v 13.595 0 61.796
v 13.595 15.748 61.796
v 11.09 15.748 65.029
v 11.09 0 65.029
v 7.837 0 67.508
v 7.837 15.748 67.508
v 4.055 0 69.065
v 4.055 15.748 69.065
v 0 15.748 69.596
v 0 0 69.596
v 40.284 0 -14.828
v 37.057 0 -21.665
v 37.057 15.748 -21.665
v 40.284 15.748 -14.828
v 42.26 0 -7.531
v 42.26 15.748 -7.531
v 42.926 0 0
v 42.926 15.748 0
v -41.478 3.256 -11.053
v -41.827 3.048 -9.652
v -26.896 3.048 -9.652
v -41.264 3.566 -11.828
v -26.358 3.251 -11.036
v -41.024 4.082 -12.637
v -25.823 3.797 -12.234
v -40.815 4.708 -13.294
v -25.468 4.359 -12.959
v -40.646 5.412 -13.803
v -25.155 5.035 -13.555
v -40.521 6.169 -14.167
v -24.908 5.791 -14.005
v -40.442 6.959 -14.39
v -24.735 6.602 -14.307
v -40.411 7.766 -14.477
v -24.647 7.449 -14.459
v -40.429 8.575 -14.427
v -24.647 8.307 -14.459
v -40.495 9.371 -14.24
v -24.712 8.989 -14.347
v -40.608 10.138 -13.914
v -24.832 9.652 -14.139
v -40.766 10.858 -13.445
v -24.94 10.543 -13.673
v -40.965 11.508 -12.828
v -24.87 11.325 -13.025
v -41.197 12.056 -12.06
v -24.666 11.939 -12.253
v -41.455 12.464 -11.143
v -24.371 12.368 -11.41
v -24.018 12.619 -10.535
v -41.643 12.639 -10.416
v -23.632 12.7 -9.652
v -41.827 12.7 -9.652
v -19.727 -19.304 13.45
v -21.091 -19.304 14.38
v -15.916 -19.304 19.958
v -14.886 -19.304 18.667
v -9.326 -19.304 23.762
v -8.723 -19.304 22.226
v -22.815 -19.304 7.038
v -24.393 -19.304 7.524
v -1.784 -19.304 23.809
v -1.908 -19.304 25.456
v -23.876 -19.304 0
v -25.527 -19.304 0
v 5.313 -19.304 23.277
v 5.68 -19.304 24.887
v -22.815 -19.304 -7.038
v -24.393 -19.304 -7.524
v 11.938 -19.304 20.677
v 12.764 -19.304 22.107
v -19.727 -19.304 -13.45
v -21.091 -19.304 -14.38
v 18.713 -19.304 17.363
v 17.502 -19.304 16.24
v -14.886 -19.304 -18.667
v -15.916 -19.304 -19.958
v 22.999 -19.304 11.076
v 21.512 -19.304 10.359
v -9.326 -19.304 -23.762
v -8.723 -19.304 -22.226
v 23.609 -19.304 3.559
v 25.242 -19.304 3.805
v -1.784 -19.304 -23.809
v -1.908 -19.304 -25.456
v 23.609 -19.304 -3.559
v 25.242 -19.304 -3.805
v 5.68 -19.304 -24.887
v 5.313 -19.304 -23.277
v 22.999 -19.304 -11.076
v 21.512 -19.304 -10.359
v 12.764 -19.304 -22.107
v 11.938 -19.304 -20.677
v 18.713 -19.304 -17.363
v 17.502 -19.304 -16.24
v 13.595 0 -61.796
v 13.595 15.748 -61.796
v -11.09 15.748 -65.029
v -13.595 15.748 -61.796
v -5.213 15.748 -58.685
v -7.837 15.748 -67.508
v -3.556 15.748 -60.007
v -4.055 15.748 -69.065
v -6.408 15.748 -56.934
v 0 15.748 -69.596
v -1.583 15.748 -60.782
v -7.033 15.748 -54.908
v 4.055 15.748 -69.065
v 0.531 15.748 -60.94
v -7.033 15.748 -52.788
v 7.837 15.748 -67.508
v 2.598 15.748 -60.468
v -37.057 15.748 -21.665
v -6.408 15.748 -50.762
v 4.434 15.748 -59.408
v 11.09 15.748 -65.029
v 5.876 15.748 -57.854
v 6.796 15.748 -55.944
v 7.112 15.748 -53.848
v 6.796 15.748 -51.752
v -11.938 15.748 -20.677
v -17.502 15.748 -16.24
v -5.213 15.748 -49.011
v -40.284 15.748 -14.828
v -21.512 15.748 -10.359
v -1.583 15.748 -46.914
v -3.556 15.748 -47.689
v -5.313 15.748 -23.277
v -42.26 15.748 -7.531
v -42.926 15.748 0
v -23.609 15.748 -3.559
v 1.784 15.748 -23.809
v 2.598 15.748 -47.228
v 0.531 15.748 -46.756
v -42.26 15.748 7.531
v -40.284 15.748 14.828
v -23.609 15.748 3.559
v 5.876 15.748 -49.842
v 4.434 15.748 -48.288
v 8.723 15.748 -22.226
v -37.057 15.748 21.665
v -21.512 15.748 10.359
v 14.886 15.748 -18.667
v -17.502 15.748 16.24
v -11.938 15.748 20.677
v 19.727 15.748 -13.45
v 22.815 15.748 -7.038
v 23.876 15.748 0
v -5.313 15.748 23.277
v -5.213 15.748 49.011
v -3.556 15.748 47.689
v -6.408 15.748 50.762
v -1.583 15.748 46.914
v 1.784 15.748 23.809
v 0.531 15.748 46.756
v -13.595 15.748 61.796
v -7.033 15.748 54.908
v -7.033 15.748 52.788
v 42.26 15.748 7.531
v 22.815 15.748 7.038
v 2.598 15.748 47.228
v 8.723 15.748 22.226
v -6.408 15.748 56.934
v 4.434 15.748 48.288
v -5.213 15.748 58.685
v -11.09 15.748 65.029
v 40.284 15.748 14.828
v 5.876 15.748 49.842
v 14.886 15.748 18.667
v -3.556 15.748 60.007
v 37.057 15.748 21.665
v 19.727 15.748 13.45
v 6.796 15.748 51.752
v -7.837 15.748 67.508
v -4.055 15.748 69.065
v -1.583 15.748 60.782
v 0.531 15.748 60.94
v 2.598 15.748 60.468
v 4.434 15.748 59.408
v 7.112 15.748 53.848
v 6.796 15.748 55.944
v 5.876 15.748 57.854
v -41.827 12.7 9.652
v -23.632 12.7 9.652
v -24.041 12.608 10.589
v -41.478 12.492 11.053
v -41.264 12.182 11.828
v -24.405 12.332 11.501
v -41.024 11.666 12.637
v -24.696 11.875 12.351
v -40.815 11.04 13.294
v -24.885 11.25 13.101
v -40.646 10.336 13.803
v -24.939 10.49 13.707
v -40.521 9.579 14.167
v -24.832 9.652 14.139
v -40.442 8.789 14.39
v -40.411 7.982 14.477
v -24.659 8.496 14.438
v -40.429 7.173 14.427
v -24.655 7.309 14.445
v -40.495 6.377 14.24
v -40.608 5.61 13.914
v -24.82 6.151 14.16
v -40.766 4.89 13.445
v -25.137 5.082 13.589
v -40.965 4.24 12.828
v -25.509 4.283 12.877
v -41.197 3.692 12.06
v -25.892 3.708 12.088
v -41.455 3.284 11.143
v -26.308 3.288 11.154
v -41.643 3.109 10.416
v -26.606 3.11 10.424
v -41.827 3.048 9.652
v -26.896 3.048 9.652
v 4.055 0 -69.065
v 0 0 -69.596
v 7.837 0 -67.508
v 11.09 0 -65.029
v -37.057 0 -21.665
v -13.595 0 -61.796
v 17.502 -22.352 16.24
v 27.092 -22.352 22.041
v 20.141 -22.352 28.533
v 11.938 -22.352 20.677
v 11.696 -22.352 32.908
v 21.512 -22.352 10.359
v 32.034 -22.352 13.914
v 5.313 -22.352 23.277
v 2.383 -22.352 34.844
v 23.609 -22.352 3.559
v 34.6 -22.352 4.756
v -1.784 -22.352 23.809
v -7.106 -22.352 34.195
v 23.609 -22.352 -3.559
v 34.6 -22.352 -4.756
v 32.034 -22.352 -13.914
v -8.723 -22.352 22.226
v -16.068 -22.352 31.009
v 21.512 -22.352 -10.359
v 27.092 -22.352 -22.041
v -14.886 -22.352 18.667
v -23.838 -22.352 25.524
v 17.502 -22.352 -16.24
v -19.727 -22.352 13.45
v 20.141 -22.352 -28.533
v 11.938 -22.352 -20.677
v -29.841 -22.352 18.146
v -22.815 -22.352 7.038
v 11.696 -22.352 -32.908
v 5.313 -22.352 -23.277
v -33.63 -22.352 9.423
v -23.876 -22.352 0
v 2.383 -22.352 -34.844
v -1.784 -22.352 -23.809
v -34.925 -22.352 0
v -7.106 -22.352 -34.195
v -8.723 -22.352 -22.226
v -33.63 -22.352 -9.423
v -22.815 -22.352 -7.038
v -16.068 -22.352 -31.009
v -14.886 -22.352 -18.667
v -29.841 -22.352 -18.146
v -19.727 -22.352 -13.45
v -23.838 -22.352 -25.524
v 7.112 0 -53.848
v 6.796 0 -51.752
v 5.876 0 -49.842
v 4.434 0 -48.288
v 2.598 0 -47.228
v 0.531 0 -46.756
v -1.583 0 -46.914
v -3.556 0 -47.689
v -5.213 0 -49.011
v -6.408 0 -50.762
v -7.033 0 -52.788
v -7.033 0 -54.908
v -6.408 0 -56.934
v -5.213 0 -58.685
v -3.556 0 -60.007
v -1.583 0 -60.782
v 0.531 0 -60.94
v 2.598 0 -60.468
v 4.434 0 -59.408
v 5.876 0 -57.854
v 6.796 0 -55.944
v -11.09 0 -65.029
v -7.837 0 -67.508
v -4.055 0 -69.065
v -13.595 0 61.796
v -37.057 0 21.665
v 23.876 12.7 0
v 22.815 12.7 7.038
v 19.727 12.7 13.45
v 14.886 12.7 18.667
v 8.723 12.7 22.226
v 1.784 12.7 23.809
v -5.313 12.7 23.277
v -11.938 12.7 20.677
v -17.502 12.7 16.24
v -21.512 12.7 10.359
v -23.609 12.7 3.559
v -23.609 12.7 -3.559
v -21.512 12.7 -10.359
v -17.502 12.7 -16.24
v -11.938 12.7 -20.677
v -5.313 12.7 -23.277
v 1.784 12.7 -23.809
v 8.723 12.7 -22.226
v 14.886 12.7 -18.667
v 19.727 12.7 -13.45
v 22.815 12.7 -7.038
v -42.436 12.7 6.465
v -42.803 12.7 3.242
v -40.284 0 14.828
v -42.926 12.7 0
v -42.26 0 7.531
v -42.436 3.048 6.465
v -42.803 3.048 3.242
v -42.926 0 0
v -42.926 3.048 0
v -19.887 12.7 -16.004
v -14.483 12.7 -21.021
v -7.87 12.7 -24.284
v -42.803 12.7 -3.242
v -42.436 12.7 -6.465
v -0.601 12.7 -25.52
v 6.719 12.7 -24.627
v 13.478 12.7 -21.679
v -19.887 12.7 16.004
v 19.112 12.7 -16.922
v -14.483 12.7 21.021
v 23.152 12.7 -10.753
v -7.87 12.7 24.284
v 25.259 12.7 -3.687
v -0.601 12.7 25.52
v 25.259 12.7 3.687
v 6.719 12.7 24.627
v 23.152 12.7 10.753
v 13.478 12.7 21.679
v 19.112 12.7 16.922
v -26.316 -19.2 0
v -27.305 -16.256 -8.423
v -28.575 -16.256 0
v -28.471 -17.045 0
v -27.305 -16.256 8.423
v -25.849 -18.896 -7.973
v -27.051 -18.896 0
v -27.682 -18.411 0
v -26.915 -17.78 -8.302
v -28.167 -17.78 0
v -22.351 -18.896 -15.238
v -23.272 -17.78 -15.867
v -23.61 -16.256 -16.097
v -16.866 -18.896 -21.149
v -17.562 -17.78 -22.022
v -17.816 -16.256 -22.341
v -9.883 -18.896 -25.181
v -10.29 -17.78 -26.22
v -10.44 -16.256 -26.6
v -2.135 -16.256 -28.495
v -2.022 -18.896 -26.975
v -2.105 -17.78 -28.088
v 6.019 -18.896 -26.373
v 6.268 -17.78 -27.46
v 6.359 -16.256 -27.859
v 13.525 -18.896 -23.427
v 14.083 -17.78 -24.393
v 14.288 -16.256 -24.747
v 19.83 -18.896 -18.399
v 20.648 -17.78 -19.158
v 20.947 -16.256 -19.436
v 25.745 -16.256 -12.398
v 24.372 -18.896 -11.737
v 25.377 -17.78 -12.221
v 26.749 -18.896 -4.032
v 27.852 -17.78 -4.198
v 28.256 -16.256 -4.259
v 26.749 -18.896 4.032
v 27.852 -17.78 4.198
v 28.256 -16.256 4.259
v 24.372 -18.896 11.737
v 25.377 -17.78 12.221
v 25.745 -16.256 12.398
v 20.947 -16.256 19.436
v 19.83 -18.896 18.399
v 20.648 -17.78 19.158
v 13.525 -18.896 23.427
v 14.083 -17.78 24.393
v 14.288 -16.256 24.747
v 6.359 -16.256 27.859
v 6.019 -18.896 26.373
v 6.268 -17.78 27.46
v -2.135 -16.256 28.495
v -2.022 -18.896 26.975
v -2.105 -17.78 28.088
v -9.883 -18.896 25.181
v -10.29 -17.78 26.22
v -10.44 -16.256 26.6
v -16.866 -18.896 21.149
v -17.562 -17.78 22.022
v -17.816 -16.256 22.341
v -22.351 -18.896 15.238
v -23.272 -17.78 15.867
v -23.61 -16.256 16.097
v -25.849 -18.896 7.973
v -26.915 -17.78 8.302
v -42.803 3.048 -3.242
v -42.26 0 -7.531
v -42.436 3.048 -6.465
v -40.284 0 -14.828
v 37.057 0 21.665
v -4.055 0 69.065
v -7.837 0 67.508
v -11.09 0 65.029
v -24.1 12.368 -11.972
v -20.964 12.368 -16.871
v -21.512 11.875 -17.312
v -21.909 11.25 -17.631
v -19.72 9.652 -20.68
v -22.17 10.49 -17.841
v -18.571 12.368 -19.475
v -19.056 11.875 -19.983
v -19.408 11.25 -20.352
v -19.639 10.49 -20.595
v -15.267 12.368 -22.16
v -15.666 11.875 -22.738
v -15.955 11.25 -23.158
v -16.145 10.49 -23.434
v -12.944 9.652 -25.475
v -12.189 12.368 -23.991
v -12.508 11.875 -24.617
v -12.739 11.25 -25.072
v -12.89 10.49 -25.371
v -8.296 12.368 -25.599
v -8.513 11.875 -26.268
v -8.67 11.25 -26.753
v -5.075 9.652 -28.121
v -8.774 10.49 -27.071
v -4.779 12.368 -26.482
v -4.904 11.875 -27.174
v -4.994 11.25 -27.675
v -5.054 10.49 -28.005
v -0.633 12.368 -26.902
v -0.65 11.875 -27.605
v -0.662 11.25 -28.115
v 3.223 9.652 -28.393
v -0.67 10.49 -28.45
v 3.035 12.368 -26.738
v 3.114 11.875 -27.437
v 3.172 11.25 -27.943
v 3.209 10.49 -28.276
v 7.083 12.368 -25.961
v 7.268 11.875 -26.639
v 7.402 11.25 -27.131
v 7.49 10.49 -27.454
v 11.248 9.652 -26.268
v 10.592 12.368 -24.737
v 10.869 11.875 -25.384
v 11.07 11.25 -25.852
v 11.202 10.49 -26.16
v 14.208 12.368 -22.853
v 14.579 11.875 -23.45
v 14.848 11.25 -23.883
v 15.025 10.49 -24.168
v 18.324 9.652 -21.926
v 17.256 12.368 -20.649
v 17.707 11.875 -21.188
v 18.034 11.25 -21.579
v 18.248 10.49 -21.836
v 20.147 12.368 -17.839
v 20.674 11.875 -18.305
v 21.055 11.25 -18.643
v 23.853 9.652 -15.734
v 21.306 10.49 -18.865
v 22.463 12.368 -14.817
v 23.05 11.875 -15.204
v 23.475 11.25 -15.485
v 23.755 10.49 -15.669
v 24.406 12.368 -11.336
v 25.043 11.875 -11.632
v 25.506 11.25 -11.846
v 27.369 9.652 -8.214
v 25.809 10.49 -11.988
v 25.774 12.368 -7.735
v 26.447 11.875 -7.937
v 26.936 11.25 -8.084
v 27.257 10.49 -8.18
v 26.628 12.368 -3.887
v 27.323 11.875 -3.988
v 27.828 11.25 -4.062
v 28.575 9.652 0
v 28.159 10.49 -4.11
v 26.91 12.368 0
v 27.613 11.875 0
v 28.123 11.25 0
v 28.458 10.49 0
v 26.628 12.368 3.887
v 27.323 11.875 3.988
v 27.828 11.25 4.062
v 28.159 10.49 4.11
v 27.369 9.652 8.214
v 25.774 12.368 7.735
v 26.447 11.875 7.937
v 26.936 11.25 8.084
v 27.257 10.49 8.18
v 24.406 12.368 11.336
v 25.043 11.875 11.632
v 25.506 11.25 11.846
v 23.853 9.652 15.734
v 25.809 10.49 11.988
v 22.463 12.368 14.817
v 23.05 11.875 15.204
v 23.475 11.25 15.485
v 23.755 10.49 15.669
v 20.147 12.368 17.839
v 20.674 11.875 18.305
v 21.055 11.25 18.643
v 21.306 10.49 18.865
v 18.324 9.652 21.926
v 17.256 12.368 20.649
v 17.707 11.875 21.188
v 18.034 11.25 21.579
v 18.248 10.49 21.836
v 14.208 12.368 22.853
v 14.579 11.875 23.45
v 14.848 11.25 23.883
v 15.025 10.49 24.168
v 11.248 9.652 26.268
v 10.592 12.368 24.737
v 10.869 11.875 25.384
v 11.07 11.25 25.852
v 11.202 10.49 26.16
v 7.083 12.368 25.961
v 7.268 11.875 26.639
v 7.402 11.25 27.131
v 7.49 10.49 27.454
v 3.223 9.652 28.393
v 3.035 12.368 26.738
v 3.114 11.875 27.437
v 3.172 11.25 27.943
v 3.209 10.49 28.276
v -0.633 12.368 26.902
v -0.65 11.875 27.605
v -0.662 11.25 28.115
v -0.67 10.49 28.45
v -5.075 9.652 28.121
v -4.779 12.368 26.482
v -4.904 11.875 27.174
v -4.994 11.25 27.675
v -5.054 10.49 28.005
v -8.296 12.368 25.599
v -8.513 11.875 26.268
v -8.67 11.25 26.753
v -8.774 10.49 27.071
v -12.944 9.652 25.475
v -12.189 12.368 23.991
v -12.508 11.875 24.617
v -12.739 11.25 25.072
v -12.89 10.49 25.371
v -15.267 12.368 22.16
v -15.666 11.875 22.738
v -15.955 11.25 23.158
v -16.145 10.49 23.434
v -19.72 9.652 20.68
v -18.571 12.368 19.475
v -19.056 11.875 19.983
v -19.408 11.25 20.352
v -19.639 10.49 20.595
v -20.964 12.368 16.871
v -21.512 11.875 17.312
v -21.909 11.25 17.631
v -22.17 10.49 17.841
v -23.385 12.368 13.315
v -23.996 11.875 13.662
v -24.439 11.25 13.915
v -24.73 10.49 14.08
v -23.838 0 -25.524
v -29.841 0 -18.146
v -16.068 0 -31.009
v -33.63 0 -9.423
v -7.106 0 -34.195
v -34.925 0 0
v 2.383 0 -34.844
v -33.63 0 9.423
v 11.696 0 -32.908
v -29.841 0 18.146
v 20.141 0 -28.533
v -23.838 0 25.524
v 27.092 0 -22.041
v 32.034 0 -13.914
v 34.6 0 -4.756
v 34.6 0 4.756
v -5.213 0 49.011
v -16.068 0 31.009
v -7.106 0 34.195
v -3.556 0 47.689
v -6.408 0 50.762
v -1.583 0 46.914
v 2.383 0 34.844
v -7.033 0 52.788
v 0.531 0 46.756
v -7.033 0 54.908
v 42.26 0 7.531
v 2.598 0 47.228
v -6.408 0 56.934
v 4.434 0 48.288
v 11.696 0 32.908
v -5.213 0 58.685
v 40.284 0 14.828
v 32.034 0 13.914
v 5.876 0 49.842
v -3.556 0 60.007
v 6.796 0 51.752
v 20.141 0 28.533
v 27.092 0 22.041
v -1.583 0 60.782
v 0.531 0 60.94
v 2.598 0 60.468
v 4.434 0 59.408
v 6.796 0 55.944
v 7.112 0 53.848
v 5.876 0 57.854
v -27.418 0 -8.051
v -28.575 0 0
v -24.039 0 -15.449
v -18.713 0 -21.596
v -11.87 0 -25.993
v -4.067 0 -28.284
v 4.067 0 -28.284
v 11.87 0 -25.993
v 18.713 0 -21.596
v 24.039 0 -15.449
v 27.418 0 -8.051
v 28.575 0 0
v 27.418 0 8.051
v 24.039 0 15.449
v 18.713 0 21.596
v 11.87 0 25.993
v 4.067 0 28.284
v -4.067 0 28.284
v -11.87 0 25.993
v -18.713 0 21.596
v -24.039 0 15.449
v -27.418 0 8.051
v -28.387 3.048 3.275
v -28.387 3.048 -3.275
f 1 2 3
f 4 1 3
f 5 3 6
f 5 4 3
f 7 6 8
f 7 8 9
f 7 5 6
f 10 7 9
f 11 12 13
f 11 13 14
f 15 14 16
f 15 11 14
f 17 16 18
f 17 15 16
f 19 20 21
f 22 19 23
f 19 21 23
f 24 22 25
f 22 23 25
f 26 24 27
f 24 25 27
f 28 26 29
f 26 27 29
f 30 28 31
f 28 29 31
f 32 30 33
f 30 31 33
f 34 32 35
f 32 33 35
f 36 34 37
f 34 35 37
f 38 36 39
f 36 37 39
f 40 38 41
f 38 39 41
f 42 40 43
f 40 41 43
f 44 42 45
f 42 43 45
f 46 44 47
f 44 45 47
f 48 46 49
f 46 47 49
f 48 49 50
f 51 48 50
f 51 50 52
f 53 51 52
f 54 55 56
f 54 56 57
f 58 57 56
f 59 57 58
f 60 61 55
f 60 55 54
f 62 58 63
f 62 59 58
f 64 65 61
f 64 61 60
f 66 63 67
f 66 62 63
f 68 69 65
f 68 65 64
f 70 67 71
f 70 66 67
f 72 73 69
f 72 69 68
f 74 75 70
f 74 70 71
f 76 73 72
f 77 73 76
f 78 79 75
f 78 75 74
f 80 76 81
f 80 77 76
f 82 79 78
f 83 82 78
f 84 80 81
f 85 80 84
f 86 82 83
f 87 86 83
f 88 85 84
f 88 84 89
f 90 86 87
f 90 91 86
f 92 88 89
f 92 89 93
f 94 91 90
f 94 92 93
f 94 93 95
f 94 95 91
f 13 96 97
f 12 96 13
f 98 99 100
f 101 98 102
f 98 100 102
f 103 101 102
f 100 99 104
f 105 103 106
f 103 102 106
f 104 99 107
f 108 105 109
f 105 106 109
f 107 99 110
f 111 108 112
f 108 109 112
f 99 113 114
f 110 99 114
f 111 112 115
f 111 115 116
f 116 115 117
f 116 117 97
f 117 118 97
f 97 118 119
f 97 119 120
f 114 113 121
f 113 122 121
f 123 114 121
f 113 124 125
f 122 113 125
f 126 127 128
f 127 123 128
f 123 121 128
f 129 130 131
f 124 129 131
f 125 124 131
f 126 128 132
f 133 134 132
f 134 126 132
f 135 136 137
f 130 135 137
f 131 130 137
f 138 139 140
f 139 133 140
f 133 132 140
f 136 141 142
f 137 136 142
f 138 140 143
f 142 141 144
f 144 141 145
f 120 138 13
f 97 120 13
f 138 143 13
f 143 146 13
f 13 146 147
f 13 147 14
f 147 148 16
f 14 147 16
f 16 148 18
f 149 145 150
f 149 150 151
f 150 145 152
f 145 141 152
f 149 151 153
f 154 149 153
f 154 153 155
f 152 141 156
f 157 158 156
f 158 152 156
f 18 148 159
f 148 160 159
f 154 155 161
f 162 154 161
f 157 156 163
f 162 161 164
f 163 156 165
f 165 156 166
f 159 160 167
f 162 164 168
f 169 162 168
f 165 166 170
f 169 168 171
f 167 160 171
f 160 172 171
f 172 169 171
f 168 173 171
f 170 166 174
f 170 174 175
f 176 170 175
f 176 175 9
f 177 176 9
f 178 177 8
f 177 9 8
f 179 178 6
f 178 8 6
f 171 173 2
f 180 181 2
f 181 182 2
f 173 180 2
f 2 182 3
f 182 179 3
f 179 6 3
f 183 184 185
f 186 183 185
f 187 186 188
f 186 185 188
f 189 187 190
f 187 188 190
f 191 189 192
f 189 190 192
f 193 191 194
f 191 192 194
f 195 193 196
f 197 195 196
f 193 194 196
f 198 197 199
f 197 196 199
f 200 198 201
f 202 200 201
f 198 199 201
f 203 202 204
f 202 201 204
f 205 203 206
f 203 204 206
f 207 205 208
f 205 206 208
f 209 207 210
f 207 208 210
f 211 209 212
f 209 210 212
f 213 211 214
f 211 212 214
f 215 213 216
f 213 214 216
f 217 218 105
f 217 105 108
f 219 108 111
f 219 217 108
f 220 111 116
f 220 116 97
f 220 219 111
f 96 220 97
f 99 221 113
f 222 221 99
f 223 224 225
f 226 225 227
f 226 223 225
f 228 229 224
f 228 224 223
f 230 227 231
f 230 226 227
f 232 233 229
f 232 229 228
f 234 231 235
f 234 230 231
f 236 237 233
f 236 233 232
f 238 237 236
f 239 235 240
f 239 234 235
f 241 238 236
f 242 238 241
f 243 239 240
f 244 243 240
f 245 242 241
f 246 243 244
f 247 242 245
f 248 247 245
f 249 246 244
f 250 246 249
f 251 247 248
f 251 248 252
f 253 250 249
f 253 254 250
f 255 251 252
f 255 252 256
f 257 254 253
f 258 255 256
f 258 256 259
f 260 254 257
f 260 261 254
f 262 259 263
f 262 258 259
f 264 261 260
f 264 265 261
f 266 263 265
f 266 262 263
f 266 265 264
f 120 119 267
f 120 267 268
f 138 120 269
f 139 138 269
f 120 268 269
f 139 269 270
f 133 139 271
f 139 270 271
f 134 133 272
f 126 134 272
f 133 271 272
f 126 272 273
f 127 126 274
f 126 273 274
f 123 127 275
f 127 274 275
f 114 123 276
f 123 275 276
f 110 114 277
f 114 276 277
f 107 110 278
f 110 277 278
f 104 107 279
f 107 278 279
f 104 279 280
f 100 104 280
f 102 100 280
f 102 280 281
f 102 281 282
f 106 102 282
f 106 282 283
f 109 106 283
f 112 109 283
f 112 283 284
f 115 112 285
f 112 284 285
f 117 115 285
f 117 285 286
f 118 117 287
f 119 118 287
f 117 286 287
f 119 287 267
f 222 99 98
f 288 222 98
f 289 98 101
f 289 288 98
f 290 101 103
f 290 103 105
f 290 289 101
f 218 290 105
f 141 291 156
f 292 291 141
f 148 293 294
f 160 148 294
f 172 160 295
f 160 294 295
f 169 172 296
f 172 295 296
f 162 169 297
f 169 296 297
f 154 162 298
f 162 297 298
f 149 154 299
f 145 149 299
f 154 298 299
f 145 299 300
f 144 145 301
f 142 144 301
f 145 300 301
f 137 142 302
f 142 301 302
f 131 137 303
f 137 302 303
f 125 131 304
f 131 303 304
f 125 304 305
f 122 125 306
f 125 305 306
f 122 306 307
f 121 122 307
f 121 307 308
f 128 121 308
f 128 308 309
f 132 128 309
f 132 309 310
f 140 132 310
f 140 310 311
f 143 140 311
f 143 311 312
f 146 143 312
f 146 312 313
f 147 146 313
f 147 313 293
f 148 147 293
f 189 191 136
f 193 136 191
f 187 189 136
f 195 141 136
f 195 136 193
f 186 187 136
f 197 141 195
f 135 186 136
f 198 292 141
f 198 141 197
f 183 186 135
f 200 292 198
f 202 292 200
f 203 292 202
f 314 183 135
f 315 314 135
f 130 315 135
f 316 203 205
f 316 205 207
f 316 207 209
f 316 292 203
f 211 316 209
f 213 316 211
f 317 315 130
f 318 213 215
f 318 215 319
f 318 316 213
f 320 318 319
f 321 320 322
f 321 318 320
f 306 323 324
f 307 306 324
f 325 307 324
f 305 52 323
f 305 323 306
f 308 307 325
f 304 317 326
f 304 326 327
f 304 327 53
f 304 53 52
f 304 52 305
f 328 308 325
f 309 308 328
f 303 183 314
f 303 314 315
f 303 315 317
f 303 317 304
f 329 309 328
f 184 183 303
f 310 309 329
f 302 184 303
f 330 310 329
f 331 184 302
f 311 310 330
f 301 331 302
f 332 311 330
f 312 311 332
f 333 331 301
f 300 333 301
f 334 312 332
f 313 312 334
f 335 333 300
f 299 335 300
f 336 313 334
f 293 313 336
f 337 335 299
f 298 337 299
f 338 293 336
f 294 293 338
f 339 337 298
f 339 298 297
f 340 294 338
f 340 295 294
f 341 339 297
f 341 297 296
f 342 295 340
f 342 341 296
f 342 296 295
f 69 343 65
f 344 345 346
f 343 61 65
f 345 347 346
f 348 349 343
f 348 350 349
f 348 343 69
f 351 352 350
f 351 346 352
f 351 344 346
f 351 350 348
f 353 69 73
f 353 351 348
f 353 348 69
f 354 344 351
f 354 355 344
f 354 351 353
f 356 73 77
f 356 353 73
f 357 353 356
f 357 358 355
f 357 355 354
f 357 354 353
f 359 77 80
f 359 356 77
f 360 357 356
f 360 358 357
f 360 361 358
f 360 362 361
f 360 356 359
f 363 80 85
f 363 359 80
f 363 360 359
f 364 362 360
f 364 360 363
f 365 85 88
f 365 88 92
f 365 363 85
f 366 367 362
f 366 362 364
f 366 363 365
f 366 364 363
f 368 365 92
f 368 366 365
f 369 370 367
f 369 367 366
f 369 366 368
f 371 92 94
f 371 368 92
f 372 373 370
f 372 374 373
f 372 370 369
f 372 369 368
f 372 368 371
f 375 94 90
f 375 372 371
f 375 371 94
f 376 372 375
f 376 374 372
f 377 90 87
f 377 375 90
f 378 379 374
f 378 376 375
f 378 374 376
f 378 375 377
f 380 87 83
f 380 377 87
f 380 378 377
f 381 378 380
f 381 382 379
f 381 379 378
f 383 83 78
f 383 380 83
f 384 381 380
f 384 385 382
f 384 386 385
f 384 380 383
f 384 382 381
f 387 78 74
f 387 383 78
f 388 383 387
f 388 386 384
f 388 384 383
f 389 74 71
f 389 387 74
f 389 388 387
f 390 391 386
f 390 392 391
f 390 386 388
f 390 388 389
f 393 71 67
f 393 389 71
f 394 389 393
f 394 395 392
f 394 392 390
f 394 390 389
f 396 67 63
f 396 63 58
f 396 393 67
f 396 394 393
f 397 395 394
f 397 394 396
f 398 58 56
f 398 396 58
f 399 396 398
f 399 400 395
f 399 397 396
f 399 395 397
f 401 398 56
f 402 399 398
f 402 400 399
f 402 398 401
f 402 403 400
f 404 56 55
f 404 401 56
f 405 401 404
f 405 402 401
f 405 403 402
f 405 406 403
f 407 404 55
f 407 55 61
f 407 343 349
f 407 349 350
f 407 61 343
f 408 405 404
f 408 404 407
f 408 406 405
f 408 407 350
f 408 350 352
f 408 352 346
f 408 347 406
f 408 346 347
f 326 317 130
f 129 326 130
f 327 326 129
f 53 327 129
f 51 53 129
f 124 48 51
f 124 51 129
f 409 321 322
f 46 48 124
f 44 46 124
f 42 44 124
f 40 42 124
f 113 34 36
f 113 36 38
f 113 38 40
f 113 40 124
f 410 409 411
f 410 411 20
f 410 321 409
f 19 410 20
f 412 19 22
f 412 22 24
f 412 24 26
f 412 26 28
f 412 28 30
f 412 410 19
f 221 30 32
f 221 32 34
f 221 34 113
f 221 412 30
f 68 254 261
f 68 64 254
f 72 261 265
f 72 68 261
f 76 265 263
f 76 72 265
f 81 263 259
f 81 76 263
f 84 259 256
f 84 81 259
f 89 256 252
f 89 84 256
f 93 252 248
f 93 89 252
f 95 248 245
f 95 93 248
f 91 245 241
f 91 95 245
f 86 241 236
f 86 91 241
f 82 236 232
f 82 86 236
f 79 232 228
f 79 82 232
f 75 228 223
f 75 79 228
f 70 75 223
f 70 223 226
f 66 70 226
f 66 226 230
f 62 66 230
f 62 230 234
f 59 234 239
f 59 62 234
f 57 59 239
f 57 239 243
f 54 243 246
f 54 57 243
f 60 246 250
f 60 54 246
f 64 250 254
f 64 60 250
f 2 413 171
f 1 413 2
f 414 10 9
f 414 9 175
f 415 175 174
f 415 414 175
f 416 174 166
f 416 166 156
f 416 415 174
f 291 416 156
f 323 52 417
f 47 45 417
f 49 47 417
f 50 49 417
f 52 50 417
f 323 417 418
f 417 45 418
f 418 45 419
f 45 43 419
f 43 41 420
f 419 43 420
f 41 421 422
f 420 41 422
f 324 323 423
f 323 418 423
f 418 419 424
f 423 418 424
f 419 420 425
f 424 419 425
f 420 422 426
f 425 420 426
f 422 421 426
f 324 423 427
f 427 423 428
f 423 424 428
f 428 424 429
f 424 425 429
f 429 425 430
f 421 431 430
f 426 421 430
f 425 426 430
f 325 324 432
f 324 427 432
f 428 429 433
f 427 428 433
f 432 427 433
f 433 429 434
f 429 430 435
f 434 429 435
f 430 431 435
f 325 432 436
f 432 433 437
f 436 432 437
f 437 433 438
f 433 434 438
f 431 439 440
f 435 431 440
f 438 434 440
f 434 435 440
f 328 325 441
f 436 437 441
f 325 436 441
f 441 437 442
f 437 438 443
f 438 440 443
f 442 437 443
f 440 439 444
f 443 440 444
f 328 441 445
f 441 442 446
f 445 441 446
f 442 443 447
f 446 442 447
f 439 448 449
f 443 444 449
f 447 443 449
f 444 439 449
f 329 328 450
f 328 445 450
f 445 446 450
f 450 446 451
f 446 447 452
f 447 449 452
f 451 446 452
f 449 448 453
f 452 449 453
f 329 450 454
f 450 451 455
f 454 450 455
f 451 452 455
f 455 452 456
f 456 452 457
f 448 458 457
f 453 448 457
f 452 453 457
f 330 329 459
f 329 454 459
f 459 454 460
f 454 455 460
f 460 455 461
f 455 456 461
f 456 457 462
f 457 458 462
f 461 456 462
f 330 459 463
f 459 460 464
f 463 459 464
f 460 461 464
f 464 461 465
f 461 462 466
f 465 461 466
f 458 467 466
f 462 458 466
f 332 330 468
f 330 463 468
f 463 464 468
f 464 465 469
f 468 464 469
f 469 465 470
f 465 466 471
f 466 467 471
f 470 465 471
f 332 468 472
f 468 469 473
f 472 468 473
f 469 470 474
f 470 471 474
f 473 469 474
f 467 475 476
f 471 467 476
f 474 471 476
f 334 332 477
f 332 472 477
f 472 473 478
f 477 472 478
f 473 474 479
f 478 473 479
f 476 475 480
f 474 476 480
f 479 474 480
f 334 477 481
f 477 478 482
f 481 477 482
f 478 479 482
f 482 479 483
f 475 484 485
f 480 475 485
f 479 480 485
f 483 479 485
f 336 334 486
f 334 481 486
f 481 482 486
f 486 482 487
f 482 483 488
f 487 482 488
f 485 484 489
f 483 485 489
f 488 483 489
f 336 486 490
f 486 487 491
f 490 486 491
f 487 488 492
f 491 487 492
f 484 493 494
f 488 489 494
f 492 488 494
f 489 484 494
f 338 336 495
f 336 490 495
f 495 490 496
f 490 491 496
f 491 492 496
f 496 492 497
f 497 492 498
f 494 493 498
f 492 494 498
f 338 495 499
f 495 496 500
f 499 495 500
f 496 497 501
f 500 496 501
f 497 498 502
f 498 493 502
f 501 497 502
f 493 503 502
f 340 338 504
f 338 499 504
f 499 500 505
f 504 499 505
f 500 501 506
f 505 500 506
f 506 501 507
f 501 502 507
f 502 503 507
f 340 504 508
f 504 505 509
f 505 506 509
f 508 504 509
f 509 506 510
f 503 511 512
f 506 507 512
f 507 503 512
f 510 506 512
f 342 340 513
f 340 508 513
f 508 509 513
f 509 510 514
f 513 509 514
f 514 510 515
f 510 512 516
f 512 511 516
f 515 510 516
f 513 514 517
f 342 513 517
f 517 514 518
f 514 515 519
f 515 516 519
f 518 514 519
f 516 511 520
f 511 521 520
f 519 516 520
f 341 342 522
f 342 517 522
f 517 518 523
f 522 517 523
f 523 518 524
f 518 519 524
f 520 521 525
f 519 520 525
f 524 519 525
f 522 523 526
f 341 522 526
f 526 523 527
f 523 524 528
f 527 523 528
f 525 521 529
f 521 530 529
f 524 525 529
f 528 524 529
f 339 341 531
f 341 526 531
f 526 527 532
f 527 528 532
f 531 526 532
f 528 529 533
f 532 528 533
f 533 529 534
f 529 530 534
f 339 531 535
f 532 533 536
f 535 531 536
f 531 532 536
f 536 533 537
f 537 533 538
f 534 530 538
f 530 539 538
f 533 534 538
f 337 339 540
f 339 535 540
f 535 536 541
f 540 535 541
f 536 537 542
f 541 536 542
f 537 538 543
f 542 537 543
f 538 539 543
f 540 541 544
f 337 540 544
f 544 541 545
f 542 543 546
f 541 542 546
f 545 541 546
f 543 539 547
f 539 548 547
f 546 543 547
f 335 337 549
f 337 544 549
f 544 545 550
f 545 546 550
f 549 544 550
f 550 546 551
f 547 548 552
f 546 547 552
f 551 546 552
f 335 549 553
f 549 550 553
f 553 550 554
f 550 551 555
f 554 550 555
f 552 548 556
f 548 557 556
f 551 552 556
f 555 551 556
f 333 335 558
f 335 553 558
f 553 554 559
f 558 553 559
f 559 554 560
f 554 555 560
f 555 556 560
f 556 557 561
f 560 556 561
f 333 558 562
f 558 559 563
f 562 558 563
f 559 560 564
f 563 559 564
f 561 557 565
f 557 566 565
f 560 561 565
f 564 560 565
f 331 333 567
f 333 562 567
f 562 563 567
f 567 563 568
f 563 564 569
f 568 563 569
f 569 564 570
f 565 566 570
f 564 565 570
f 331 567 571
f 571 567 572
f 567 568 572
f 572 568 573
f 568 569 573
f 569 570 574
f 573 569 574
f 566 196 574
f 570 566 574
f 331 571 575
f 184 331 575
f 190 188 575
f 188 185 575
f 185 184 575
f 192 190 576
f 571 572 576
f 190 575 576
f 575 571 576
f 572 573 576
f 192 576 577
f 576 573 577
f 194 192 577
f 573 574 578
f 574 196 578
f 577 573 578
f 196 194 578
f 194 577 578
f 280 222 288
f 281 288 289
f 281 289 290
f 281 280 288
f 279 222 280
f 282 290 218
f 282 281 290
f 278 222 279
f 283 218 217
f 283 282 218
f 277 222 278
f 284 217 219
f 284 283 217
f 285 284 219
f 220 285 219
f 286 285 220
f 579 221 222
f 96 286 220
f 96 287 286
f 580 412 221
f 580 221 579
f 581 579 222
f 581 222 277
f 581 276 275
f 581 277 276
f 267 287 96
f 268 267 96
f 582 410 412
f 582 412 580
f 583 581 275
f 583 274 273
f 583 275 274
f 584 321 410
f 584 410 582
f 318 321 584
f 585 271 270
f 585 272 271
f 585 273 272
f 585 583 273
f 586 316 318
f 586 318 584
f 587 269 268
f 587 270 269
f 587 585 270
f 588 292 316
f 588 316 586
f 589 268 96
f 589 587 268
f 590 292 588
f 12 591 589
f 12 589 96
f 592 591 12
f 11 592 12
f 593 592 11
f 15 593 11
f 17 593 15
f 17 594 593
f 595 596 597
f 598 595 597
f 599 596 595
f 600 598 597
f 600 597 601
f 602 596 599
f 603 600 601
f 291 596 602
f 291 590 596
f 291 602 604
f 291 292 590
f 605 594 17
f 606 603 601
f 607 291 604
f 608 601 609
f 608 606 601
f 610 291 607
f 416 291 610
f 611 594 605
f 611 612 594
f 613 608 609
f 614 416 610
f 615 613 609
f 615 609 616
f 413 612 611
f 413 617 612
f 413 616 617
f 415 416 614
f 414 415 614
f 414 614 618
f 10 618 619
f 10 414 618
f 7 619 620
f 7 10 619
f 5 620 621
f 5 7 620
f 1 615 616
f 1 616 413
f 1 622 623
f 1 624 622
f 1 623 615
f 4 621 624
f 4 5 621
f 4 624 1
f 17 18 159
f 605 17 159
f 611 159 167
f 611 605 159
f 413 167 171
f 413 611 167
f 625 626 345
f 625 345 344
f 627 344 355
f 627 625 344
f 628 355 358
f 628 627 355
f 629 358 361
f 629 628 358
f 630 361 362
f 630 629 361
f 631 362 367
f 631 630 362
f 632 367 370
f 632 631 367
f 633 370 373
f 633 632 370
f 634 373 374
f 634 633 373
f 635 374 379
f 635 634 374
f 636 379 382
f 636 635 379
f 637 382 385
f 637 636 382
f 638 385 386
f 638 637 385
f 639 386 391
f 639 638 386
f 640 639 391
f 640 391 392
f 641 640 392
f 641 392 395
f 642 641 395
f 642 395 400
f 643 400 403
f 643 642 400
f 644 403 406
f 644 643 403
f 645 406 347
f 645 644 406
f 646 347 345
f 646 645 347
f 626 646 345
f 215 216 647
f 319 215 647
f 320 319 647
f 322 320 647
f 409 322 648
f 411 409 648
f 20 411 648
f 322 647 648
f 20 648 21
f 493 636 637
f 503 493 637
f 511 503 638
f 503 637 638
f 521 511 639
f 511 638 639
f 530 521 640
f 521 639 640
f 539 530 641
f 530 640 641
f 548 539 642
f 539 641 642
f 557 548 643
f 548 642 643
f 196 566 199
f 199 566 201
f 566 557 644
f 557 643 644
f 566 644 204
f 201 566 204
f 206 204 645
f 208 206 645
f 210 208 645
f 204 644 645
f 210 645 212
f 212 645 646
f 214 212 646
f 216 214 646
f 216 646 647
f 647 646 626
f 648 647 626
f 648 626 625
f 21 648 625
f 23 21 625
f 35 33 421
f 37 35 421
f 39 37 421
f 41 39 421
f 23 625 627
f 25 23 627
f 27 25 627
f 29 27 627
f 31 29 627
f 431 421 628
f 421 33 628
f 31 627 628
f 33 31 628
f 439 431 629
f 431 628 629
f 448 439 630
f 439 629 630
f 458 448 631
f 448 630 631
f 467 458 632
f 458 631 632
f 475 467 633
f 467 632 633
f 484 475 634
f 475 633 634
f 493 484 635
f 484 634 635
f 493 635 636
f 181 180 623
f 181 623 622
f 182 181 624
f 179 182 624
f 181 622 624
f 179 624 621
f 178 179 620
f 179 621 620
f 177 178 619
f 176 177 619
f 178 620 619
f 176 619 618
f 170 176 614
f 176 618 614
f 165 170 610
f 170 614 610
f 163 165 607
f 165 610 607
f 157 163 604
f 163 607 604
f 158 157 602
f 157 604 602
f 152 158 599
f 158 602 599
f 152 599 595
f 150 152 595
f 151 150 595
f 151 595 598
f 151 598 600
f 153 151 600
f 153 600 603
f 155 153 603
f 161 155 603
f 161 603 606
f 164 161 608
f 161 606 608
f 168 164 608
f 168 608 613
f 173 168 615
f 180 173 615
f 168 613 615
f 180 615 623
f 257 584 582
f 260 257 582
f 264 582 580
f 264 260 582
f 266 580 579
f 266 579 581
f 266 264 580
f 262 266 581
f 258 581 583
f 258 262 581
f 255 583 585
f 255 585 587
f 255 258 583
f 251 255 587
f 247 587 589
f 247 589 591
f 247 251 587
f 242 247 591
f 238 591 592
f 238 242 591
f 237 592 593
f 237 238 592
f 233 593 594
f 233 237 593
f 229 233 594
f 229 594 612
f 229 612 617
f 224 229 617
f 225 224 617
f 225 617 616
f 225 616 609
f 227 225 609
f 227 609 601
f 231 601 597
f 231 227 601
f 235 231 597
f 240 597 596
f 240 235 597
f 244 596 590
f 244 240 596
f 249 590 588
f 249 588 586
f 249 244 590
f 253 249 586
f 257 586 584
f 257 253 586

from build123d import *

# Parameters (mm, degrees)
F0_R     = 7.112
F0_R_2   = 23.876
F1_DEPTH = 15.748
F4_R     = 28.575
F5_DEPTH = 12.7
F6_R     = 3.048
F8_DEPTH = 42.927


with BuildPart() as f1:
    # F0 (on Front) → F1 (new body)
    with BuildSketch(Plane.XZ):
        with BuildLine():
            Line((-13.59501, 61.796283), (-37.057366, 21.665481))
            ThreePointArc((-37.057366, 21.665481), (-41.432873, 11.223123), (-42.926, 0))
            ThreePointArc((-42.926, 0), (-41.432873, -11.223123), (-37.057366, -21.665481))
            Line((-37.057366, -21.665481), (-13.59501, -61.796283))
            ThreePointArc((-13.59501, -61.796283), (-7.83677, -67.507595), (0, -69.596))
            ThreePointArc((0, -69.596), (7.83677, -67.507595), (13.59501, -61.796283))
            Line((13.59501, -61.796283), (37.057366, -21.665481))
            ThreePointArc((37.057366, -21.665481), (41.432873, -11.223123), (42.926, 0))
            ThreePointArc((42.926, 0), (41.432873, 11.223123), (37.057366, 21.665481))
            Line((37.057366, 21.665481), (13.59501, 61.796283))
            ThreePointArc((13.59501, 61.796283), (7.83677, 67.507595), (0, 69.596))
            ThreePointArc((0, 69.596), (-7.83677, 67.507595), (-13.59501, 61.796283))
        make_face()
        with Locations((0, -53.848)):
            Circle(F0_R, mode=Mode.SUBTRACT)
        Circle(F0_R_2, mode=Mode.SUBTRACT)
        with Locations((0, 53.848)):
            Circle(F0_R, mode=Mode.SUBTRACT)
    extrude(amount=-F1_DEPTH)

    # F2 (on Top) → F3 (revolve)
    with BuildSketch(Plane.XY):
        with BuildLine():
            Line((-28.575, 0), (-34.925, 0))
            Line((-34.925, 0), (-34.925, -22.352))
            Line((-34.925, -22.352), (-23.876, -22.352))
            Line((-23.876, -22.352), (-23.876, -19.304))
            Line((-23.876, -19.304), (-25.527, -19.304))
            ThreePointArc((-25.527, -19.304), (-27.682261, -18.411261), (-28.575, -16.256))
            Line((-28.575, -16.256), (-28.575, 0))
        make_face()
    revolve(axis=Axis((0, -12.095788, 0), (0, -1, 0)))

    # F4 (on face) → F5 (cut)
    with BuildSketch(Plane.XZ):
        Circle(F4_R)
    extrude(amount=-F5_DEPTH, mode=Mode.SUBTRACT)

    # F6
    f6_edges = [f1.edges().sort_by_distance(p)[0] for p in [
        (-28.575, 12.7, 0),
    ]]
    fillet(f6_edges, radius=F6_R)

    # F7 (on Right) → F8 (cut, through all)
    with BuildSketch(Plane.YZ):
        with BuildLine():
            Line((3.048, 9.652), (3.048, 0))
            Line((3.048, 0), (3.048, -9.652))
            ThreePointArc((3.048, -9.652), (7.874, -14.478), (12.7, -9.652))
            Line((12.7, -9.652), (12.7, 0))
            Line((12.7, 0), (12.7, 9.652))
            ThreePointArc((12.7, 9.652), (7.874, 14.478), (3.048, 9.652))
        make_face()
    extrude(amount=-F8_DEPTH, mode=Mode.SUBTRACT)


solid = f1.part
